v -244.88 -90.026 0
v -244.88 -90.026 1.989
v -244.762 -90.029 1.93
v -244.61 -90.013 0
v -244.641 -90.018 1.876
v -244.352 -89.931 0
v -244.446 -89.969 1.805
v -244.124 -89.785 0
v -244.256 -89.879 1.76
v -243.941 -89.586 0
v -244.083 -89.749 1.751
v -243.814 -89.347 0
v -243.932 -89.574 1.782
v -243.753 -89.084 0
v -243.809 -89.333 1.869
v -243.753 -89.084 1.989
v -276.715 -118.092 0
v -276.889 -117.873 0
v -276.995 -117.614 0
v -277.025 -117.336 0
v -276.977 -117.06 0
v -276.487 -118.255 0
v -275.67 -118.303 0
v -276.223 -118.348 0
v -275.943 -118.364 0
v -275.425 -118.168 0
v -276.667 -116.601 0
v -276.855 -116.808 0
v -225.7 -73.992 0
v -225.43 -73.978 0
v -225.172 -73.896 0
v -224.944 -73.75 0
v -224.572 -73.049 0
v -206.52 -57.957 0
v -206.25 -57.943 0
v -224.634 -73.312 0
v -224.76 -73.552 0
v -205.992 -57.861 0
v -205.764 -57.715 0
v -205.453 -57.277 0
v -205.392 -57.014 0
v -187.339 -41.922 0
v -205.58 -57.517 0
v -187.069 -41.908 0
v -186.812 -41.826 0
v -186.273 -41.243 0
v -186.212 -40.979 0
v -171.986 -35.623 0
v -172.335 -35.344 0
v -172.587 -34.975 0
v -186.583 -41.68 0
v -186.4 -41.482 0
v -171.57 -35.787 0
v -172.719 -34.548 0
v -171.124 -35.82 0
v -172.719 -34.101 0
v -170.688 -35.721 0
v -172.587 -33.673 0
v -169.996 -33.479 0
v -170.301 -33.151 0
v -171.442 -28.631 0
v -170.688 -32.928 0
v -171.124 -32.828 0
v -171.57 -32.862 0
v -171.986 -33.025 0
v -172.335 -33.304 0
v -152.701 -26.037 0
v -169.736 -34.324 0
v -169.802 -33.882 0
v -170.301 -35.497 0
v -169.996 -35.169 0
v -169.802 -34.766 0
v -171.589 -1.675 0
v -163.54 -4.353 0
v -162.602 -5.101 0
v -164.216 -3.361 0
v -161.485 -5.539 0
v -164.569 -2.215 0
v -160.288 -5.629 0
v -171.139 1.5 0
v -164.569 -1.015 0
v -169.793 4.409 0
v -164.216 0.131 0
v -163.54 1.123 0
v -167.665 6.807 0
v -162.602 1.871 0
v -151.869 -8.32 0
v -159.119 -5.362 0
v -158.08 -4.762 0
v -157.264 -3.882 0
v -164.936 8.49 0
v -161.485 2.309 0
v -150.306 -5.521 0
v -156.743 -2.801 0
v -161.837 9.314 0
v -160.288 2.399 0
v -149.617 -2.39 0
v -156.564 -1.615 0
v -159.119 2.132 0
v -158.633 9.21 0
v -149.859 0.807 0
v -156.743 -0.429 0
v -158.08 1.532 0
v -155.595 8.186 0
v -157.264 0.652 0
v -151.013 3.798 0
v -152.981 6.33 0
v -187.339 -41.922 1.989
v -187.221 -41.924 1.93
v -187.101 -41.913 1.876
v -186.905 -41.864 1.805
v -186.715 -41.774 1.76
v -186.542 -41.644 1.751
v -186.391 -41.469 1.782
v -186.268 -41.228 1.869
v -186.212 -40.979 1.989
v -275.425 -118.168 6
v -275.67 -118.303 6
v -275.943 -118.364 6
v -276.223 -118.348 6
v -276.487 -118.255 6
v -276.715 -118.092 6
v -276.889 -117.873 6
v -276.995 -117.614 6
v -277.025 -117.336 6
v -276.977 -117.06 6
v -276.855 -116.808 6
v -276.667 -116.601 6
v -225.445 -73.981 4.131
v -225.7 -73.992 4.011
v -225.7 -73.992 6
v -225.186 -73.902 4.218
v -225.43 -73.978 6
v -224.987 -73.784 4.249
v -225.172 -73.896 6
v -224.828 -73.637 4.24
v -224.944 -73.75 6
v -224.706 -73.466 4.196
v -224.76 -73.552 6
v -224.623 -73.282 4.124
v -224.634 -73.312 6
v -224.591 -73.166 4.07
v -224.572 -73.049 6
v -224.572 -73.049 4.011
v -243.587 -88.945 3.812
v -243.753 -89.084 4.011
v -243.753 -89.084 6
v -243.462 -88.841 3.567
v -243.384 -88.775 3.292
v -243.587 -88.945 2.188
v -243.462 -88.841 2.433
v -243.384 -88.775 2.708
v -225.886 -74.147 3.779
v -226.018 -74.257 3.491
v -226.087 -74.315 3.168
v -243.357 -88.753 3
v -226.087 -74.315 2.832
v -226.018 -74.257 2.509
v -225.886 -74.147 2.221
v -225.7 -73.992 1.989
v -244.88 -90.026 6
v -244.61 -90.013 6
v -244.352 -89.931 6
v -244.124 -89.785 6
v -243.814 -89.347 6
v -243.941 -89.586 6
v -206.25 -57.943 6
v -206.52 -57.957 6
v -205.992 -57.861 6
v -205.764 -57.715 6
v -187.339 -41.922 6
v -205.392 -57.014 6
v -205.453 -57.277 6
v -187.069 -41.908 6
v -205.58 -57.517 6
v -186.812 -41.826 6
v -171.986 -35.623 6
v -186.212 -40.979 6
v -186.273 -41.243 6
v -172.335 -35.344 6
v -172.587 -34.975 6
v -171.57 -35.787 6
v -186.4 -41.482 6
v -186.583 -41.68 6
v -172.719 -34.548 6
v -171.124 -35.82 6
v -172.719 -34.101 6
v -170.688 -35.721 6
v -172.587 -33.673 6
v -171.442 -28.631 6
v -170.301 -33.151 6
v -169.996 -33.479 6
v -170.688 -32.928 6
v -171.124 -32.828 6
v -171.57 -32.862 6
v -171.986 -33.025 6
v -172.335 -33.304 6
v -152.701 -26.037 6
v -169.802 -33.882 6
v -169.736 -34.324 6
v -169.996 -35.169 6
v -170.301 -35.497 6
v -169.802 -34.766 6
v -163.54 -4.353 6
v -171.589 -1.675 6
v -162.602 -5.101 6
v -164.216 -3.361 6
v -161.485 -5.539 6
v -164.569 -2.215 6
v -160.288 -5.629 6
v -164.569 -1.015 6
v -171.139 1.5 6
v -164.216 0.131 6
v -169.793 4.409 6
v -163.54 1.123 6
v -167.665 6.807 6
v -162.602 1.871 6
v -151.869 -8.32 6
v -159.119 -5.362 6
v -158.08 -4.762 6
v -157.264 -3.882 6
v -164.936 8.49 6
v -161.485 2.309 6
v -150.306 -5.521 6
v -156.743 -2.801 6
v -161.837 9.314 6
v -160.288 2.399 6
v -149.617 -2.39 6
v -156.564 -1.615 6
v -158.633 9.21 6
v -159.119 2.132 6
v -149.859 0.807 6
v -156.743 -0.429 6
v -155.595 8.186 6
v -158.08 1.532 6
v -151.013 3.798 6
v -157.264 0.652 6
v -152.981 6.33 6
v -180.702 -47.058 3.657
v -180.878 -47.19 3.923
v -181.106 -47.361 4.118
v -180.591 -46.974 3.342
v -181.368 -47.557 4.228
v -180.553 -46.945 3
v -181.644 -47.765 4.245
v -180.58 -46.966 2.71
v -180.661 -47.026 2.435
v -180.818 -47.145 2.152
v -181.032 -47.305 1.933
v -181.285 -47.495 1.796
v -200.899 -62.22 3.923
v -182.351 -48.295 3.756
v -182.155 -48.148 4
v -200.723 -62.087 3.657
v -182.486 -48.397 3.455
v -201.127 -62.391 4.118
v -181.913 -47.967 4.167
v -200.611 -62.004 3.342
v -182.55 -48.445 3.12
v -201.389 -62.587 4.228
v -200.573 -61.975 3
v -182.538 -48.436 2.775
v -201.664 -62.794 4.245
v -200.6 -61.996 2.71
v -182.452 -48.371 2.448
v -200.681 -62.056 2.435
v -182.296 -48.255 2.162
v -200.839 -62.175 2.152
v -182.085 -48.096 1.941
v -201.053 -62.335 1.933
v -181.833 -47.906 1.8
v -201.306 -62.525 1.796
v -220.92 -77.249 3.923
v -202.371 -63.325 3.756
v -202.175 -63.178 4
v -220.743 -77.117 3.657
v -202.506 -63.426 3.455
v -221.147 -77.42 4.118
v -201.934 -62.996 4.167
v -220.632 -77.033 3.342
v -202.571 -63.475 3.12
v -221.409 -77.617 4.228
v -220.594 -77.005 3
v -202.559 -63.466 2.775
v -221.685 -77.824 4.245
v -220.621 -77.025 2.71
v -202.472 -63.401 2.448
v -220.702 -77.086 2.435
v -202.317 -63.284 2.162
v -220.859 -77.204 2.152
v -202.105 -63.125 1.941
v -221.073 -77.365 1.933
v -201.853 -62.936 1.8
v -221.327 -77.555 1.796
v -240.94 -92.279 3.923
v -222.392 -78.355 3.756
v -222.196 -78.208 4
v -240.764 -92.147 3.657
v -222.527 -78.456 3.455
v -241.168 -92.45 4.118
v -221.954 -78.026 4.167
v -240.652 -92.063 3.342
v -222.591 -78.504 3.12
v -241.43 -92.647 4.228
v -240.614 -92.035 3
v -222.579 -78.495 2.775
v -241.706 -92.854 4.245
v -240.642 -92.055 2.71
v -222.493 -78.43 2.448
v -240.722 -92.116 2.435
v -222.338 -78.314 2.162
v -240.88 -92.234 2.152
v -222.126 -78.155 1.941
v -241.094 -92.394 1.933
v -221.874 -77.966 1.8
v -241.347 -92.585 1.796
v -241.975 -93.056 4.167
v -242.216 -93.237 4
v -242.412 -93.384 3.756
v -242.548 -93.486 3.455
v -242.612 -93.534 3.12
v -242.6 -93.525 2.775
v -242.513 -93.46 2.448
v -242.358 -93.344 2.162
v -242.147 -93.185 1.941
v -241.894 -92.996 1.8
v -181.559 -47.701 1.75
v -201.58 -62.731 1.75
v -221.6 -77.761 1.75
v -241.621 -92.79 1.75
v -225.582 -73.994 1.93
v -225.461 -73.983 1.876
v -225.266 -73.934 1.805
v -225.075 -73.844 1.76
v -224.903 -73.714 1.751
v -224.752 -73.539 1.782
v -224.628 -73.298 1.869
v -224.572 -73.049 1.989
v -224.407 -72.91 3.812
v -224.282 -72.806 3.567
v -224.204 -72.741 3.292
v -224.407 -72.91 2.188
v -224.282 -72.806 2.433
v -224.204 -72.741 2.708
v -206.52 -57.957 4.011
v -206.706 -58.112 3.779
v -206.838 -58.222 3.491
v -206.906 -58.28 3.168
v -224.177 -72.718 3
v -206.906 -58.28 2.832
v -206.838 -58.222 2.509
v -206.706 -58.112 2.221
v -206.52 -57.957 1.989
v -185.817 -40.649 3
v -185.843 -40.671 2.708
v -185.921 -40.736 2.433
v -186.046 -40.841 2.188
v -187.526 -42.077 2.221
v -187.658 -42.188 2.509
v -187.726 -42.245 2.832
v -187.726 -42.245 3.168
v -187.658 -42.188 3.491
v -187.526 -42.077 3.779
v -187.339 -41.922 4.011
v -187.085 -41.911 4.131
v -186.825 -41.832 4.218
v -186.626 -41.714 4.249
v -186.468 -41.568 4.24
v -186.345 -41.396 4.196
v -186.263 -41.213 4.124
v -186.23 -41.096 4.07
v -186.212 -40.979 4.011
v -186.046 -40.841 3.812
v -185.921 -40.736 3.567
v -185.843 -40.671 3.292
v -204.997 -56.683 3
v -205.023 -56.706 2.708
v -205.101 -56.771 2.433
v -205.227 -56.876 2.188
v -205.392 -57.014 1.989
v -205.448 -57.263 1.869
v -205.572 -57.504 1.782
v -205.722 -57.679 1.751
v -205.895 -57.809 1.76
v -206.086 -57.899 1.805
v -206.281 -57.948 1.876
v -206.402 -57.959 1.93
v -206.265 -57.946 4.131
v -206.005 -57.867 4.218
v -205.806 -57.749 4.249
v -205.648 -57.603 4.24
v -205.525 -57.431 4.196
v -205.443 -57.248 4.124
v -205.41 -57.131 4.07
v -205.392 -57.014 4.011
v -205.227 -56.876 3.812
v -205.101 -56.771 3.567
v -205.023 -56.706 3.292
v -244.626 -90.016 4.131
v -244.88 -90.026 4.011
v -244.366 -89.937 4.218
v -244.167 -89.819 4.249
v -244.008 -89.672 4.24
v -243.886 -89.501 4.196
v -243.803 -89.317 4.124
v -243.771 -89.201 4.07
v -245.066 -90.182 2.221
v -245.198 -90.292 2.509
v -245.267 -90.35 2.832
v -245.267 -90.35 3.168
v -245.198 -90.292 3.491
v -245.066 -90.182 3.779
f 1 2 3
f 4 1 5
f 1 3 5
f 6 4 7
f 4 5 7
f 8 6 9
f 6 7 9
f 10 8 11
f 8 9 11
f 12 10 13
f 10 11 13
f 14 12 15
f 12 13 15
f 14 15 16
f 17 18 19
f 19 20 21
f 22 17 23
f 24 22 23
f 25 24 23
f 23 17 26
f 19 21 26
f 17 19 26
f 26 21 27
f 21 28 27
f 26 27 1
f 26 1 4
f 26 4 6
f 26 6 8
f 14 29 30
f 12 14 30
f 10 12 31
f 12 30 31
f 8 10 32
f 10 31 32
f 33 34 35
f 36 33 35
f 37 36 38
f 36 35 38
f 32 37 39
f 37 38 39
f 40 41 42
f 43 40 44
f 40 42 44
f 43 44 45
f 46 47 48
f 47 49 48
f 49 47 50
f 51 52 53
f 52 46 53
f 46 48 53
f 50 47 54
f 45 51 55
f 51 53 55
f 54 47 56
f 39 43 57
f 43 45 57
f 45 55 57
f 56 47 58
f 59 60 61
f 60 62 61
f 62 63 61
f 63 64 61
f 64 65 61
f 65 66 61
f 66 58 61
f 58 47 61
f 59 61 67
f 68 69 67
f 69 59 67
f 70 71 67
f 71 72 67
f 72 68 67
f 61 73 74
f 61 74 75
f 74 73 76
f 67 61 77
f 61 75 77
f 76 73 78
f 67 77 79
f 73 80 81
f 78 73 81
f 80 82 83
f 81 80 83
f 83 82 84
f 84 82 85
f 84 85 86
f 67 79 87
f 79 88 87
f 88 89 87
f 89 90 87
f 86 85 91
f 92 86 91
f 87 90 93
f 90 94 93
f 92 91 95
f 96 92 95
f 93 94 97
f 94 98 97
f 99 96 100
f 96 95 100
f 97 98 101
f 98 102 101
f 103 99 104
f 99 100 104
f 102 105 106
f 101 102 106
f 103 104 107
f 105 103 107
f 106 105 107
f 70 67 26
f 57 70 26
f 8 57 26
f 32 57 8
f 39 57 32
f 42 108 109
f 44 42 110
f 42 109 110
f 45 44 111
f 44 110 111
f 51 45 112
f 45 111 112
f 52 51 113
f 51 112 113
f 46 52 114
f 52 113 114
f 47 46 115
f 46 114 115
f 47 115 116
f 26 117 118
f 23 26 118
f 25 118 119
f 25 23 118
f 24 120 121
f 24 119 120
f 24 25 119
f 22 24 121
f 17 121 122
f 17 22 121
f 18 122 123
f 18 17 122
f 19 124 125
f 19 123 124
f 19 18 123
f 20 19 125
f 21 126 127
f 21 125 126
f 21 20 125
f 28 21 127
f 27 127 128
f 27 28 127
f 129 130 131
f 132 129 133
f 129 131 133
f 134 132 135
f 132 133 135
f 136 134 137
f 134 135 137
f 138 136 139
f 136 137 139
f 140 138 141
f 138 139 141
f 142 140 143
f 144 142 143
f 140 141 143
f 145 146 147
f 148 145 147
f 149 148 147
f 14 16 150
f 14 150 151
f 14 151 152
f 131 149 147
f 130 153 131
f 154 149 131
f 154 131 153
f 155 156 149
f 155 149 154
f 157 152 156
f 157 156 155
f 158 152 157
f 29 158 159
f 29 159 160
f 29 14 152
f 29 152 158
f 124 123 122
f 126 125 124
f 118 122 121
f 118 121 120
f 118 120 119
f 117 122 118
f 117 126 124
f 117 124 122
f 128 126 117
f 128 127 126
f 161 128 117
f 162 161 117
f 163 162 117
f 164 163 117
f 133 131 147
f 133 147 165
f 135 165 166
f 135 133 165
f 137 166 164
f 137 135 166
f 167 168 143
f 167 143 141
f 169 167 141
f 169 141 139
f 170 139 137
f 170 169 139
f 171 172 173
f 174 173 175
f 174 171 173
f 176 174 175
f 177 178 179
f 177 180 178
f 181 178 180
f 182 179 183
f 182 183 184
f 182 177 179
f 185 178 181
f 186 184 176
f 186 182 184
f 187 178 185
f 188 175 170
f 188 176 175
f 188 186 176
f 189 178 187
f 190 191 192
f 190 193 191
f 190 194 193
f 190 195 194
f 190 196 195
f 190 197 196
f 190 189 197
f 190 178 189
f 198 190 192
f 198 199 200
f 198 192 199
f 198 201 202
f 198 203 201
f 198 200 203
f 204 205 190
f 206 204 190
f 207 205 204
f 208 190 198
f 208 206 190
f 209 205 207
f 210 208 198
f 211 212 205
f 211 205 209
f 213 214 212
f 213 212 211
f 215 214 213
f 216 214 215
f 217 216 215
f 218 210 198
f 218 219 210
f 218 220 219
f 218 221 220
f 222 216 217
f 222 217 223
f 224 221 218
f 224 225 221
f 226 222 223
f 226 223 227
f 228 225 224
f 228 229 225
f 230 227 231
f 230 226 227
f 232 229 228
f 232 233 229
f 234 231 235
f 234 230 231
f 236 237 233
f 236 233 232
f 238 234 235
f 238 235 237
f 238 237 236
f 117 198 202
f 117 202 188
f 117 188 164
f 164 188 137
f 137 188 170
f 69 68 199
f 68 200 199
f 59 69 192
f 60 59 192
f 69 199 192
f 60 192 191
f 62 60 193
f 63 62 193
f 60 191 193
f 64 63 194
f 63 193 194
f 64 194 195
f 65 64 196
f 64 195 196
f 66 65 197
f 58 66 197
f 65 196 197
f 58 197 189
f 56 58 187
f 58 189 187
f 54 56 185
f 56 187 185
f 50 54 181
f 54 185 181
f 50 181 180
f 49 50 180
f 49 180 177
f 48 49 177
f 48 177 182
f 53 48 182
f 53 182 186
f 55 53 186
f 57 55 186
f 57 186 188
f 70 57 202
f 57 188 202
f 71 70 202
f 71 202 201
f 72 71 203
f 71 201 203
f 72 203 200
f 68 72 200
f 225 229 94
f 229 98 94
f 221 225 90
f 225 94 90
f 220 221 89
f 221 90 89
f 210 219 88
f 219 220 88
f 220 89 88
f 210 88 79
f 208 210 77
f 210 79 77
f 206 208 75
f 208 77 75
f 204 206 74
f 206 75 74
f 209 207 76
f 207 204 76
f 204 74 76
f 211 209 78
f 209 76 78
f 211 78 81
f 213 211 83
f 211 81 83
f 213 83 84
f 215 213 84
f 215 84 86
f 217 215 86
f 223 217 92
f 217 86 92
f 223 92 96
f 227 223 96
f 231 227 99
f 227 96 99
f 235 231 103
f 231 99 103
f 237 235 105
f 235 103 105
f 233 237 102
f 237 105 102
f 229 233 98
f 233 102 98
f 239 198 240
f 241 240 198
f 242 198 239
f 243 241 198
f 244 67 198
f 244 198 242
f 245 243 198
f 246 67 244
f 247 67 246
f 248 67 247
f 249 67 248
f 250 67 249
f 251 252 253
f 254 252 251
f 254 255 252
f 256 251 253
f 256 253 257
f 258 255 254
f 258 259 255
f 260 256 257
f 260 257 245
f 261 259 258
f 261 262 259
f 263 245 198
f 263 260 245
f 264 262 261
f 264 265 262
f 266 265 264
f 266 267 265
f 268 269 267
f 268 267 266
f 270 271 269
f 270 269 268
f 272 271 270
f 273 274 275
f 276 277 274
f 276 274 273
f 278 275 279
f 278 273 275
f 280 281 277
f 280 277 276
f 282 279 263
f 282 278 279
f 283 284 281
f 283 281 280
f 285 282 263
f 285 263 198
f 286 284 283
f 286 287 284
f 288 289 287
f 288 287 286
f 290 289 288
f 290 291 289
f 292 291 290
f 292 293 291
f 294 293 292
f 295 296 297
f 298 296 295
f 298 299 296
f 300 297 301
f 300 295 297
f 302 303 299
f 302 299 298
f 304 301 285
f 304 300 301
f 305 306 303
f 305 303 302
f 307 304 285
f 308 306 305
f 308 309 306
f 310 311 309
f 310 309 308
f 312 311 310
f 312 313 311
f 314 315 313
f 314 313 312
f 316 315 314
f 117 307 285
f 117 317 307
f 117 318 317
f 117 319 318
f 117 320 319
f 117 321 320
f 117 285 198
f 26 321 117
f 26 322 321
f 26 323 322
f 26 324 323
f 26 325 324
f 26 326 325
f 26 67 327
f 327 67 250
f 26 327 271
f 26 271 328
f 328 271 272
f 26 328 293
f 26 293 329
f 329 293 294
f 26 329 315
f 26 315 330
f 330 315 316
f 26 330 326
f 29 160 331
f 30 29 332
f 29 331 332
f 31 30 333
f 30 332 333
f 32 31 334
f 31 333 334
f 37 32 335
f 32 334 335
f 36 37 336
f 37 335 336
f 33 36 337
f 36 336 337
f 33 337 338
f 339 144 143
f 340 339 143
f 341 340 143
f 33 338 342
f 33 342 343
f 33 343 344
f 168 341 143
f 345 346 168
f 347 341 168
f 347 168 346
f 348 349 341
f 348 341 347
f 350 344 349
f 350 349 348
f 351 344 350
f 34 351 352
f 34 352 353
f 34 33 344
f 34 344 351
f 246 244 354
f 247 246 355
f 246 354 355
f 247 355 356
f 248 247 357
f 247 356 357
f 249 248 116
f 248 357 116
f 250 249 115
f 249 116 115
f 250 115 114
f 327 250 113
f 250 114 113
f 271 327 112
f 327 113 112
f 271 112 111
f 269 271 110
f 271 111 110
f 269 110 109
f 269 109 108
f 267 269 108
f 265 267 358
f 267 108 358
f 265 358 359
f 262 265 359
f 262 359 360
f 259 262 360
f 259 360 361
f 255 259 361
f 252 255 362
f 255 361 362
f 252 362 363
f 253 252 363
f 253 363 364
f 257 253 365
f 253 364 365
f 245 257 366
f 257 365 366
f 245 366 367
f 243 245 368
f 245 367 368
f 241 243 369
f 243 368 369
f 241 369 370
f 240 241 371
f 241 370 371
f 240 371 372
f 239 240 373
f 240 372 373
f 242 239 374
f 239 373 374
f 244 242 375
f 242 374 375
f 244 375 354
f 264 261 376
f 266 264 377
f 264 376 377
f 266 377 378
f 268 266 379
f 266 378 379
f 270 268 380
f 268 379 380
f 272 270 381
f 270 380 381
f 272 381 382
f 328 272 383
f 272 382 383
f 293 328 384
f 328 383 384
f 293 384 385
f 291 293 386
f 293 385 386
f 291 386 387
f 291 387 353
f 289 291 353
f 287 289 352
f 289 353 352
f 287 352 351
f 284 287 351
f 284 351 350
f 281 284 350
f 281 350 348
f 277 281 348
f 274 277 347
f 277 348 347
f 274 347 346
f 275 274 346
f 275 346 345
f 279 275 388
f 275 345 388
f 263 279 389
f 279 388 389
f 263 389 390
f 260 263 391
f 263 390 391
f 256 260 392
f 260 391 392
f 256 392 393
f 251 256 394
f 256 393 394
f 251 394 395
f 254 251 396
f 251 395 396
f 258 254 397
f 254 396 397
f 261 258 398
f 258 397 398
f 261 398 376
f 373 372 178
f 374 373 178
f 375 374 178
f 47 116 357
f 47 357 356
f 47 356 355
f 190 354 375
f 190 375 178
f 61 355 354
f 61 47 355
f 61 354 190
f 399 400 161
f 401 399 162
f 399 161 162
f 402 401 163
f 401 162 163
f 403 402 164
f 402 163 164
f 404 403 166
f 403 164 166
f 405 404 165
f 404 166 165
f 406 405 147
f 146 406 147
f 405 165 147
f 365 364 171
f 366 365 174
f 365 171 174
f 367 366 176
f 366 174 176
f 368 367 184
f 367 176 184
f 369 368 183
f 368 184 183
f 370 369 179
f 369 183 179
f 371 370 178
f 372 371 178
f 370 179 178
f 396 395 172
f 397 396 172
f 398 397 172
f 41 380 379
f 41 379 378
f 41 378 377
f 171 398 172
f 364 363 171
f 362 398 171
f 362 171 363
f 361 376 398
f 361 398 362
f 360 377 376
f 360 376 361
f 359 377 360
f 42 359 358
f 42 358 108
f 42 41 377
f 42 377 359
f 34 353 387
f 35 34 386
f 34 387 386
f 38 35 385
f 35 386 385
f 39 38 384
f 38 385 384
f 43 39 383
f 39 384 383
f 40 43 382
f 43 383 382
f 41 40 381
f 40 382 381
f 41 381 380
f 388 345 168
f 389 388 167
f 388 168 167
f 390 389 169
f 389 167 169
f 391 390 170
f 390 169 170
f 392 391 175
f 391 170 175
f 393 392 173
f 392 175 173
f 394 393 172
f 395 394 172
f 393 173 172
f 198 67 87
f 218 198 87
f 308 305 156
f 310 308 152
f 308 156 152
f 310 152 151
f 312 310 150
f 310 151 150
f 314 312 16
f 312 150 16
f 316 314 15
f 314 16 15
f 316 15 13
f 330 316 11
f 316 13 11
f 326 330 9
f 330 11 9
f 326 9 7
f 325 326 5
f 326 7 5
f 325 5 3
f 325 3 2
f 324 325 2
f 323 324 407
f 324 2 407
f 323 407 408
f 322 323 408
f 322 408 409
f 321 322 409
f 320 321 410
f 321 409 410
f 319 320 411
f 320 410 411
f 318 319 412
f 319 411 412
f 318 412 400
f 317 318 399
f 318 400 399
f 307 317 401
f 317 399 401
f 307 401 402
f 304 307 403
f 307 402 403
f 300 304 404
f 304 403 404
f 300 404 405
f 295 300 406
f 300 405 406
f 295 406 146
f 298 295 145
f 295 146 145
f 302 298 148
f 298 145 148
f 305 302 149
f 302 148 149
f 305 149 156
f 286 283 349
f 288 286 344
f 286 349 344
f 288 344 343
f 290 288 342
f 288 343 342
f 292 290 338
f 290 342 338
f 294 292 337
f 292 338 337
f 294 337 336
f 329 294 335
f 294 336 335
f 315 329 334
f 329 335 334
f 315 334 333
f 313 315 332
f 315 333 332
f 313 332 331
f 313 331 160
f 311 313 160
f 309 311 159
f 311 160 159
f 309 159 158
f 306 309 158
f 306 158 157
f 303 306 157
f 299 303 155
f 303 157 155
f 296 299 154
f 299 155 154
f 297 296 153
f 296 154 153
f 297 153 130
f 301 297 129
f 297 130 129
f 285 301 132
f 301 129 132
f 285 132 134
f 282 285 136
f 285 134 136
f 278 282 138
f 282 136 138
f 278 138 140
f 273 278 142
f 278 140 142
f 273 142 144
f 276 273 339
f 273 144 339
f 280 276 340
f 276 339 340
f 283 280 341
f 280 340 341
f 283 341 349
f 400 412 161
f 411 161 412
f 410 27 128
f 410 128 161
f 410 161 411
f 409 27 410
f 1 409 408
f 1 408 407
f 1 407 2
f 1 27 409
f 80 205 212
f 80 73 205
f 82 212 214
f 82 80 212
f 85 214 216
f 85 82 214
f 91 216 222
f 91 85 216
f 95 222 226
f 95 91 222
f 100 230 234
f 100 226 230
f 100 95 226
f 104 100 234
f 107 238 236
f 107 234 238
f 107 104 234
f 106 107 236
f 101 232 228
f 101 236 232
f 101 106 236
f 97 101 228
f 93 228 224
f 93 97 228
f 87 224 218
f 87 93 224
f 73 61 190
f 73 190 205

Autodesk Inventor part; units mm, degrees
ref_plane "YZ Plane" through (0, 0, 0) normal (1, 0, 0) x (0, 1, 0)
ref_plane "XZ Plane" through (0, 0, 0) normal (0, 1, 0) x (-1, 0, 0)
ref_plane "XY Plane" through (0, 0, 0) normal (0, 0, 1) x (1, 0, 0)
sketch "スケッチ1" plane through (0, 0, 0) normal (0, 0, 1) x (1, 0, 0)
  circle A0 centre (-149.101, -13.3308) radius 1.5 construction
  circle A1 centre (-160.5892, -1.6149) radius 1.5 construction
  circle A2 centre (-44.4492, 64.0137) radius 1.5 construction
  circle A3 centre (-64.4423, 49.0046) radius 1.5 construction
  circle A4 centre (-60.4494, 64.5064) radius 1.5 construction
  arc A5 (-40.2316, 58.3956) -> (-44.233, 71.0354) centre (-44.4492, 64.0137) ccw construction
  line L0 (-44.233, 71.0354) -> (-60.2332, 71.5281) construction
  arc A6 (-60.2332, 71.5281) -> (-64.1725, 70.4637) centre (-60.4494, 64.5064) ccw construction
  line L1 (-64.1725, 70.4637) -> (-165.9022, 6.8864) construction
  arc A7 (-165.9022, 6.8864) -> (-166.8262, -9.4635) centre (-160.5892, -1.6149) ccw construction
  line L2 (-166.8262, -9.4635) -> (-154.0782, -19.594) construction
  arc A8 (-154.0782, -19.594) -> (-144.2981, -19.7286) centre (-149.101, -13.3308) ccw construction
  line L3 (-144.2981, -19.7286) -> (-40.2316, 58.3956) construction
  circle A9 centre (-82.1645, 51.5544) radius 1.5 construction
  circle A10 centre (-141.748, 14.817) radius 1.5 construction
  circle A11 centre (-89.4637, 29.5642) radius 1.5 construction
  circle A12 centre (-117.4541, 8.5514) radius 1.5 construction
  circle A13 centre (-111.8449, 33.0052) radius 1.5 construction
  line L4 (-152.7009, -26.0367) -> (-305.9655, -141.0946)
  circle A14 centre (-149.101, -13.3308) radius 1.5 construction
  circle A15 centre (-149.101, -13.3308) radius 3 construction
  circle A16 centre (-149.101, -13.3308) radius 3 construction
  circle A17 centre (-160.5892, -1.6149) radius 9.025 construction
  circle A18 centre (-160.5892, -1.6149) radius 4.025
  line L5 (-152.7009, -26.0367) -> (-151.5741, -2.0382)
  line L6 (-64.1725, 70.4637) -> (-165.9022, 6.8864) construction
  line L7 (-144.2981, -19.7286) -> (-40.2316, 58.3956) construction
  line L8 (-305.9655, -141.0946) -> (-171.4423, -28.6314)
  line L9 (-160.5892, -1.6149) -> (-146.0204, -21.0215) construction
  line L10 (-146.0204, -21.0215) -> (-305.9655, -141.0946) construction
  circle A19 centre (-276.0256, -117.3678) radius 1
  circle A20 centre (-160.5892, -1.6149) radius 11
  line L11 (-171.4423, -28.6314) -> (-171.589, -1.6748)
  point P0 (0, 0)
  point P1 (0, 0)
  point P2 (-276.667, -116.6006)
  point P3 (-275.4252, -118.1676)
  point P4 (-151.8691, -8.3201)
  dimension "d6" = 22
  dimension "d0" = 6
  dimension "d1" = 8.05
  dimension "d2" = 5
  dimension "d3" = 3
  dimension "d4" = 200
  dimension "d5" = 2
  dimension "d7" = 3
  dimension "d8" = 6
extrude "押し出し1" add sketch "スケッチ1" along normal blind 6 contours L4 A19 L8 L11 A20 L5 | A19 | A20
sketch "スケッチ2" plane through (0, 0, 6) normal (0, 0, 1) x (1, 0, 0)
  line L0 (-171.589, -1.6748) -> (-171.4423, -28.6314) projected
  line L1 (-171.4423, -28.6314) -> (-276.667, -116.6006) projected
  arc A0 (-276.667, -116.6006) -> (-275.4252, -118.1676) centre (-276.0256, -117.3678) ccw projected
  line L2 (-275.4252, -118.1676) -> (-152.7009, -26.0367) projected
  line L3 (-152.7009, -26.0367) -> (-151.8691, -8.3201) projected
  arc A1 (-151.8691, -8.3201) -> (-171.589, -1.6748) centre (-160.5892, -1.6149) ccw projected
  circle A2 centre (-160.5892, -1.6149) radius 4.025 projected
  circle A3 centre (-171.2358, -34.3242) radius 1.5
  circle A4 centre (-171.2358, -34.3242) radius 3
  circle A5 centre (-171.2358, -34.3242) radius 4.5
  point P0 (0, 0)
  dimension "d11" = 3
  dimension "d12" = 6
  dimension "d13" = 9
extrude "押し出し2" cut sketch "スケッチ2" against normal through all contours A3
sketch "スケッチ3" plane through (0, 0, 6) normal (0, 0, 1) x (1, 0, 0)
  line L0 (-171.4423, -28.6314) -> (-276.667, -116.6006) projected
  circle A0 centre (-244.7975, -88.9797) radius 1.05
  circle A1 centre (-225.6172, -72.9448) radius 1.05
  circle A2 centre (-206.437, -56.9099) radius 1.05
  circle A3 centre (-187.2568, -40.8749) radius 1.05
  point P0 (0, 0)
  dimension "d16" = 2.1
  dimension "d17" = 2.1
  dimension "d18" = 2.1
  dimension "d19" = 2.1
  dimension "d20" = 0.75
  dimension "d21" = 0.75
  dimension "d22" = 0.75
  dimension "d23" = 0.75
  dimension "d24" = 20
  dimension "d25" = 25
  dimension "d26" = 25
  dimension "d27" = 25
extrude "押し出し3" cut sketch "スケッチ3" against normal through all
sketch "スケッチ4" plane through (-205.3922, -57.0139, 6) normal (-0.6413971, 0.7672091, 0) x (0.7672091, 0.6413971, 0)
  line L0 (-25, 6) -> (-25, 0) projected
  line L1 (-1.4697, 0) -> (-25, 0) projected
  line L2 (-1.4697, 0) -> (-1.4697, 6) projected
  line L3 (-1.4697, 6) -> (-25, 6) projected
  line L4 (-26.4697, 0) -> (-26.4697, 6) projected
  line L5 (-26.4697, 6) -> (-50, 6) projected
  line L6 (-50, 6) -> (-50, 0) projected
  line L7 (-26.4697, 0) -> (-50, 0) projected
  line L8 (-51.4697, 0) -> (-51.4697, 6) projected
  line L9 (-51.4697, 6) -> (-92.9014, 6) projected
  line L10 (-92.9014, 6) -> (-92.9014, 0) projected
  line L11 (-51.4697, 0) -> (-92.9014, 0) projected
  line L12 (0, 6) -> (0, 0) projected
  line L13 (23.5303, 0) -> (0, 0) projected
  line L14 (23.5303, 0) -> (23.5303, 6) projected
  line L15 (23.5303, 6) -> (0, 6) projected
  line L16 (25, 6) -> (25, 0) projected
  line L17 (44.2511, 0) -> (25, 0) projected
  line L18 (44.2511, 6) -> (44.2511, 0) projected
  line L19 (44.2511, 6) -> (25, 6) projected
  circle A0 centre (-50.7348, 3) radius 1.25
  circle A1 centre (-25.7348, 3) radius 1.25
  circle A2 centre (-0.7348, 3) radius 1.25
  circle A3 centre (24.2652, 3) radius 1.25
  line L20 (23.5303, 6) -> (25, 6) projected
  line L21 (-1.4697, 6) -> (0, 6) projected
  line L22 (-26.4697, 6) -> (-25, 6) projected
  line L23 (-51.4697, 6) -> (-50, 6) projected
  point P0 (194.1473, 6)
  point P1 (-51.4697, 3)
  point P2 (-26.4697, 3)
  point P3 (-50.7348, 6)
  point P4 (-25.7348, 6)
  point P5 (-0.7348, 6)
  point P6 (24.2652, 6)
  point P7 (23.5303, 3)
  point P8 (-1.4697, 3)
  dimension "d30" = 2.5
  dimension "d31" = 2.5
  dimension "d32" = 2.5
  dimension "d33" = 2.5
extrude "押し出し4" cut sketch "スケッチ4" against normal through all contours A1 L0 | L0 A1 L4 | L4 A1 | A2 L12 L2 | L2 A2 | A2 L12 | A0 L6 | L6 A0 L8 | A3 L16 L14 | L14 A3 | L8 A0 | A3 L16
sketch "スケッチ5" plane through (0, 0, 6) normal (0, 0, 1) x (1, 0, 0)
  arc A0 (-225.7, -73.9915) -> (-224.5724, -73.0489) centre (-225.6172, -72.9448) ccw projected
  line L0 (-225.7, -73.9915) -> (-243.7526, -89.0838) projected
  arc A1 (-244.8802, -90.0264) -> (-243.7526, -89.0838) centre (-244.7975, -88.9797) ccw projected
  line L1 (-244.8802, -90.0264) -> (-276.667, -116.6006) projected
  arc A2 (-276.667, -116.6006) -> (-275.4252, -118.1676) centre (-276.0256, -117.3678) ccw projected
  line L2 (-275.4252, -118.1676) -> (-152.7009, -26.0367) projected
  line L3 (-152.7009, -26.0367) -> (-151.8691, -8.3201) projected
  arc A3 (-151.8691, -8.3201) -> (-171.589, -1.6748) centre (-160.5892, -1.6149) ccw projected
  line L4 (-171.589, -1.6748) -> (-171.4423, -28.6314) projected
  line L5 (-171.4423, -28.6314) -> (-186.2119, -40.979) projected
  arc A4 (-187.3395, -41.9217) -> (-186.2119, -40.979) centre (-187.2568, -40.8749) ccw projected
  line L6 (-187.3395, -41.9217) -> (-205.3922, -57.0139) projected
  arc A5 (-206.5197, -57.9566) -> (-205.3922, -57.0139) centre (-206.437, -56.9099) ccw projected
  line L7 (-206.5197, -57.9566) -> (-224.5724, -73.0489) projected
  circle A6 centre (-171.2358, -34.3242) radius 1.5 projected
  circle A7 centre (-160.5892, -1.6149) radius 4.025 projected
  point P0 (0, 0)
equation "\"d8\" = d0"
equation "\"d21\" = d20"
equation "\"d22\" = d21"
equation "\"d23\" = d21"
equation "\"d26\" = d25"
equation "\"d27\" = d26"
properties part number "アームシールド根本1" material "アルミニウム 7075"
